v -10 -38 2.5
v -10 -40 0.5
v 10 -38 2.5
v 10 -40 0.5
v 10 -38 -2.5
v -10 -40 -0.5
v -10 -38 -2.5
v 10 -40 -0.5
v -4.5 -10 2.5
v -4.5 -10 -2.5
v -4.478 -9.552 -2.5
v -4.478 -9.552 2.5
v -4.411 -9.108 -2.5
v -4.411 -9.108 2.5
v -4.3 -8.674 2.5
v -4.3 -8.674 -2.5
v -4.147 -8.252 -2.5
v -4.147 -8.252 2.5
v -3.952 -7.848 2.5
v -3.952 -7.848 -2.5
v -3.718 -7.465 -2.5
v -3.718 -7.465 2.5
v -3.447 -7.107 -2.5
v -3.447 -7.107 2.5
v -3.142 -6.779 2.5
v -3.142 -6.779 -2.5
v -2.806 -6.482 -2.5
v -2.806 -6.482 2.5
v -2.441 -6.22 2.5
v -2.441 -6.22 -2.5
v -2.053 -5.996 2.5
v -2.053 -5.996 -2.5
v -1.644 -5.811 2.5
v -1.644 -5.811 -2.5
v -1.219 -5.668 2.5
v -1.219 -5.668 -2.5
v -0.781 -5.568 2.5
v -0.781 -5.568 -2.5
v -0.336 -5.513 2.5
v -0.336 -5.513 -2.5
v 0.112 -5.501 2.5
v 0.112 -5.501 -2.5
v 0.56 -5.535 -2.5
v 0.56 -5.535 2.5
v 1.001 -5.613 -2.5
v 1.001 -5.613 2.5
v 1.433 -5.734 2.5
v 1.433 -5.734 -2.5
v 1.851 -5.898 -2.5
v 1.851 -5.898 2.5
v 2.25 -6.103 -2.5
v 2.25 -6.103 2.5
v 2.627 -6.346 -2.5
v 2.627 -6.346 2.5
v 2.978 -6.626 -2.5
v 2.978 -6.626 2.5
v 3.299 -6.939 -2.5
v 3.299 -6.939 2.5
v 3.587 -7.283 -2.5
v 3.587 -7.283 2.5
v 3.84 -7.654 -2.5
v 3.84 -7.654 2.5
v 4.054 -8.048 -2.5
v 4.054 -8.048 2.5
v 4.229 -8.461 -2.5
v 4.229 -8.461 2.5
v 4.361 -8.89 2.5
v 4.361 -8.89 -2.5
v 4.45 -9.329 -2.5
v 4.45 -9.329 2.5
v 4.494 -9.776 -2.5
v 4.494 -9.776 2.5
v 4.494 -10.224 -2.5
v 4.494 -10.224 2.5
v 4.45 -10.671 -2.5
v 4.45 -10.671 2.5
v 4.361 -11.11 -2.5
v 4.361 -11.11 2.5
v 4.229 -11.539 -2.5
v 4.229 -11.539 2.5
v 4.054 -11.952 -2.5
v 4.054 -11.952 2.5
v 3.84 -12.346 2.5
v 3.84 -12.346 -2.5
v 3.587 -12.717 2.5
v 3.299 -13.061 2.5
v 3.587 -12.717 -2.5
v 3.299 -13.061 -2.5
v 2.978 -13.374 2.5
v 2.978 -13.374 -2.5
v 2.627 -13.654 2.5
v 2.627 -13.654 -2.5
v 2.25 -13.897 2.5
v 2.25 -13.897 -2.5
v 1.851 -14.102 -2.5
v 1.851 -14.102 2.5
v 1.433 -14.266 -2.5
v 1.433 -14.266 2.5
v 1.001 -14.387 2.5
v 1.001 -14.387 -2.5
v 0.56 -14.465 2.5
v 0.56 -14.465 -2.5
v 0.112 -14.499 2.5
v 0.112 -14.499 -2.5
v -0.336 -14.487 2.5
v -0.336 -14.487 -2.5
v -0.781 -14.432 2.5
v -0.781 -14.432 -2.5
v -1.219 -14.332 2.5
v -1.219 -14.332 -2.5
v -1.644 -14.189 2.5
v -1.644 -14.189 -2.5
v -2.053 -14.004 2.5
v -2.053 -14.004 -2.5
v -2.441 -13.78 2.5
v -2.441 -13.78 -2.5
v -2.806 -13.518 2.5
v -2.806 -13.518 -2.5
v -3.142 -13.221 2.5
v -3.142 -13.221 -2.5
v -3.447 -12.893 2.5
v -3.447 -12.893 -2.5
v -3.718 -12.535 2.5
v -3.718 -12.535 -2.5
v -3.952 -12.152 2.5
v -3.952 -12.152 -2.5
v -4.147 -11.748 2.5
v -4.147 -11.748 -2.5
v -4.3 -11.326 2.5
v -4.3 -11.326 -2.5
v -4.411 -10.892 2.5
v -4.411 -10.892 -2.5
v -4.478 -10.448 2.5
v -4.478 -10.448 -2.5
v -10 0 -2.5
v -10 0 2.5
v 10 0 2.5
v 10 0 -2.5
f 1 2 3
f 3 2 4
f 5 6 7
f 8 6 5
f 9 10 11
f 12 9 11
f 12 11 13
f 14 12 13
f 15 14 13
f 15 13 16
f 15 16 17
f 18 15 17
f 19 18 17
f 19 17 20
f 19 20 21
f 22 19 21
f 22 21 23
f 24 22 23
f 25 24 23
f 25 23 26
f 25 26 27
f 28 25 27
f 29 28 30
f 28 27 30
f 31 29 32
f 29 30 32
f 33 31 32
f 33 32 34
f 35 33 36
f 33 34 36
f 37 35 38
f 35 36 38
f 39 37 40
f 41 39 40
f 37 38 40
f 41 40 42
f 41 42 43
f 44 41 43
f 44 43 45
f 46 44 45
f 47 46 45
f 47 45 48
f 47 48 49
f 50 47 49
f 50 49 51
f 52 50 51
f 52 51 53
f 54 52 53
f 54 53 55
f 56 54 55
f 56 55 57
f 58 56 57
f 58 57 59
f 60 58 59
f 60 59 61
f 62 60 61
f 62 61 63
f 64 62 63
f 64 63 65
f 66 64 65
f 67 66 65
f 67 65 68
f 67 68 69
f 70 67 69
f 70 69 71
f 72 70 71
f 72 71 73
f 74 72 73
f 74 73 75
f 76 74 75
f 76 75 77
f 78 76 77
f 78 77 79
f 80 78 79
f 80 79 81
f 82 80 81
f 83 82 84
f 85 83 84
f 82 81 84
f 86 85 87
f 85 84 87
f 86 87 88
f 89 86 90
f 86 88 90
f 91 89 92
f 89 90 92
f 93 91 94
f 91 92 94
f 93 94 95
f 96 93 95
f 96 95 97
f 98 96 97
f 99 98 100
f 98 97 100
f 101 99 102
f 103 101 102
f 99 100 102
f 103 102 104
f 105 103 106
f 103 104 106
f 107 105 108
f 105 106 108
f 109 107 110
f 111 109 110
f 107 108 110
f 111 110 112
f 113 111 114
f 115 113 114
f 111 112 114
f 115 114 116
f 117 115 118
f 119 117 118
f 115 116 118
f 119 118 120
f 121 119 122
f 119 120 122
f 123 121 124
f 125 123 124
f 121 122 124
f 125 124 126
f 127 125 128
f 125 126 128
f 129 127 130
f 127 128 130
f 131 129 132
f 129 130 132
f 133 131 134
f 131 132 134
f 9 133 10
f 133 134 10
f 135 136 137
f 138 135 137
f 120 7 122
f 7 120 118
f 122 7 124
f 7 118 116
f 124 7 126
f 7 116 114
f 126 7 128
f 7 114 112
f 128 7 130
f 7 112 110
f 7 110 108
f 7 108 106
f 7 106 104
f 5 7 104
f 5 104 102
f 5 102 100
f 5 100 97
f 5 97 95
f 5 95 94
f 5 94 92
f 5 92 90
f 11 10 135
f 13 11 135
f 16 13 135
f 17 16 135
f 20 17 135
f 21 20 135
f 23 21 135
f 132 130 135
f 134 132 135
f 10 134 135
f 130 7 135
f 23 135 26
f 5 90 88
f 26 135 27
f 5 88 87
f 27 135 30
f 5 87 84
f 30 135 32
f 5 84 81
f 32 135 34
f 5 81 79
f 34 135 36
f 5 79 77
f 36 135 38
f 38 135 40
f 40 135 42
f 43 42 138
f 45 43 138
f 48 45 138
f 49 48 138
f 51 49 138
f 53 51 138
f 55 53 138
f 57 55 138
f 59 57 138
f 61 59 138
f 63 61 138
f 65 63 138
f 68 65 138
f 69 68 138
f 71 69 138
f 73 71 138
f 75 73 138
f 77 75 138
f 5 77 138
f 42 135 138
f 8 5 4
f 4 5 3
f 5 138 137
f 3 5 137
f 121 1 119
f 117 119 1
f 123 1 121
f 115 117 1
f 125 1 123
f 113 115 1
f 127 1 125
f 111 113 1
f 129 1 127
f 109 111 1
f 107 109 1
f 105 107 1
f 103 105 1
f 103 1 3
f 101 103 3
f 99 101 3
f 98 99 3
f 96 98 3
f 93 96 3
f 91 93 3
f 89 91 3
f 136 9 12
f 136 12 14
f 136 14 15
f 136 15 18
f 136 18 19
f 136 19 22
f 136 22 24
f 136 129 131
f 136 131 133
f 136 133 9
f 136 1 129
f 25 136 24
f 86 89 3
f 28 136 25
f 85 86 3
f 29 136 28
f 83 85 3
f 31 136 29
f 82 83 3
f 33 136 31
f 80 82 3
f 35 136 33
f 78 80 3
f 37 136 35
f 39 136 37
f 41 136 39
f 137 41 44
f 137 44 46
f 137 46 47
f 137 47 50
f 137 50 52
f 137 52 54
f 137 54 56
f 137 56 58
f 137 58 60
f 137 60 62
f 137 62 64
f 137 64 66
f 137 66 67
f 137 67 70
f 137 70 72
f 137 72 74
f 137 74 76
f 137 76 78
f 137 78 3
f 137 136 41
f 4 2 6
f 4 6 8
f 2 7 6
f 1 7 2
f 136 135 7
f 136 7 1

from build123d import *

# Parameters (mm, degrees)
F0_W     = 20
F0_H     = 5
F1_DEPTH = 40
F3_D     = 9
F4_SIZE  = 2


with BuildPart() as f1:
    # F0 (on Front) → F1 (new body)
    with BuildSketch(Plane.XZ):
        Rectangle(F0_W, F0_H)
    extrude(amount=F1_DEPTH)

    # F3 (through all)
    with Locations(Plane.XY.offset(2.5)):
        with Locations((0, -10)):
            Hole(F3_D / 2)

    # F4
    f4_edges = [f1.edges().sort_by_distance(p)[0] for p in [
        (0, -40, 2.5),
        (0, -40, -2.5),
    ]]
    chamfer(f4_edges, length=F4_SIZE)


solid = f1.part
